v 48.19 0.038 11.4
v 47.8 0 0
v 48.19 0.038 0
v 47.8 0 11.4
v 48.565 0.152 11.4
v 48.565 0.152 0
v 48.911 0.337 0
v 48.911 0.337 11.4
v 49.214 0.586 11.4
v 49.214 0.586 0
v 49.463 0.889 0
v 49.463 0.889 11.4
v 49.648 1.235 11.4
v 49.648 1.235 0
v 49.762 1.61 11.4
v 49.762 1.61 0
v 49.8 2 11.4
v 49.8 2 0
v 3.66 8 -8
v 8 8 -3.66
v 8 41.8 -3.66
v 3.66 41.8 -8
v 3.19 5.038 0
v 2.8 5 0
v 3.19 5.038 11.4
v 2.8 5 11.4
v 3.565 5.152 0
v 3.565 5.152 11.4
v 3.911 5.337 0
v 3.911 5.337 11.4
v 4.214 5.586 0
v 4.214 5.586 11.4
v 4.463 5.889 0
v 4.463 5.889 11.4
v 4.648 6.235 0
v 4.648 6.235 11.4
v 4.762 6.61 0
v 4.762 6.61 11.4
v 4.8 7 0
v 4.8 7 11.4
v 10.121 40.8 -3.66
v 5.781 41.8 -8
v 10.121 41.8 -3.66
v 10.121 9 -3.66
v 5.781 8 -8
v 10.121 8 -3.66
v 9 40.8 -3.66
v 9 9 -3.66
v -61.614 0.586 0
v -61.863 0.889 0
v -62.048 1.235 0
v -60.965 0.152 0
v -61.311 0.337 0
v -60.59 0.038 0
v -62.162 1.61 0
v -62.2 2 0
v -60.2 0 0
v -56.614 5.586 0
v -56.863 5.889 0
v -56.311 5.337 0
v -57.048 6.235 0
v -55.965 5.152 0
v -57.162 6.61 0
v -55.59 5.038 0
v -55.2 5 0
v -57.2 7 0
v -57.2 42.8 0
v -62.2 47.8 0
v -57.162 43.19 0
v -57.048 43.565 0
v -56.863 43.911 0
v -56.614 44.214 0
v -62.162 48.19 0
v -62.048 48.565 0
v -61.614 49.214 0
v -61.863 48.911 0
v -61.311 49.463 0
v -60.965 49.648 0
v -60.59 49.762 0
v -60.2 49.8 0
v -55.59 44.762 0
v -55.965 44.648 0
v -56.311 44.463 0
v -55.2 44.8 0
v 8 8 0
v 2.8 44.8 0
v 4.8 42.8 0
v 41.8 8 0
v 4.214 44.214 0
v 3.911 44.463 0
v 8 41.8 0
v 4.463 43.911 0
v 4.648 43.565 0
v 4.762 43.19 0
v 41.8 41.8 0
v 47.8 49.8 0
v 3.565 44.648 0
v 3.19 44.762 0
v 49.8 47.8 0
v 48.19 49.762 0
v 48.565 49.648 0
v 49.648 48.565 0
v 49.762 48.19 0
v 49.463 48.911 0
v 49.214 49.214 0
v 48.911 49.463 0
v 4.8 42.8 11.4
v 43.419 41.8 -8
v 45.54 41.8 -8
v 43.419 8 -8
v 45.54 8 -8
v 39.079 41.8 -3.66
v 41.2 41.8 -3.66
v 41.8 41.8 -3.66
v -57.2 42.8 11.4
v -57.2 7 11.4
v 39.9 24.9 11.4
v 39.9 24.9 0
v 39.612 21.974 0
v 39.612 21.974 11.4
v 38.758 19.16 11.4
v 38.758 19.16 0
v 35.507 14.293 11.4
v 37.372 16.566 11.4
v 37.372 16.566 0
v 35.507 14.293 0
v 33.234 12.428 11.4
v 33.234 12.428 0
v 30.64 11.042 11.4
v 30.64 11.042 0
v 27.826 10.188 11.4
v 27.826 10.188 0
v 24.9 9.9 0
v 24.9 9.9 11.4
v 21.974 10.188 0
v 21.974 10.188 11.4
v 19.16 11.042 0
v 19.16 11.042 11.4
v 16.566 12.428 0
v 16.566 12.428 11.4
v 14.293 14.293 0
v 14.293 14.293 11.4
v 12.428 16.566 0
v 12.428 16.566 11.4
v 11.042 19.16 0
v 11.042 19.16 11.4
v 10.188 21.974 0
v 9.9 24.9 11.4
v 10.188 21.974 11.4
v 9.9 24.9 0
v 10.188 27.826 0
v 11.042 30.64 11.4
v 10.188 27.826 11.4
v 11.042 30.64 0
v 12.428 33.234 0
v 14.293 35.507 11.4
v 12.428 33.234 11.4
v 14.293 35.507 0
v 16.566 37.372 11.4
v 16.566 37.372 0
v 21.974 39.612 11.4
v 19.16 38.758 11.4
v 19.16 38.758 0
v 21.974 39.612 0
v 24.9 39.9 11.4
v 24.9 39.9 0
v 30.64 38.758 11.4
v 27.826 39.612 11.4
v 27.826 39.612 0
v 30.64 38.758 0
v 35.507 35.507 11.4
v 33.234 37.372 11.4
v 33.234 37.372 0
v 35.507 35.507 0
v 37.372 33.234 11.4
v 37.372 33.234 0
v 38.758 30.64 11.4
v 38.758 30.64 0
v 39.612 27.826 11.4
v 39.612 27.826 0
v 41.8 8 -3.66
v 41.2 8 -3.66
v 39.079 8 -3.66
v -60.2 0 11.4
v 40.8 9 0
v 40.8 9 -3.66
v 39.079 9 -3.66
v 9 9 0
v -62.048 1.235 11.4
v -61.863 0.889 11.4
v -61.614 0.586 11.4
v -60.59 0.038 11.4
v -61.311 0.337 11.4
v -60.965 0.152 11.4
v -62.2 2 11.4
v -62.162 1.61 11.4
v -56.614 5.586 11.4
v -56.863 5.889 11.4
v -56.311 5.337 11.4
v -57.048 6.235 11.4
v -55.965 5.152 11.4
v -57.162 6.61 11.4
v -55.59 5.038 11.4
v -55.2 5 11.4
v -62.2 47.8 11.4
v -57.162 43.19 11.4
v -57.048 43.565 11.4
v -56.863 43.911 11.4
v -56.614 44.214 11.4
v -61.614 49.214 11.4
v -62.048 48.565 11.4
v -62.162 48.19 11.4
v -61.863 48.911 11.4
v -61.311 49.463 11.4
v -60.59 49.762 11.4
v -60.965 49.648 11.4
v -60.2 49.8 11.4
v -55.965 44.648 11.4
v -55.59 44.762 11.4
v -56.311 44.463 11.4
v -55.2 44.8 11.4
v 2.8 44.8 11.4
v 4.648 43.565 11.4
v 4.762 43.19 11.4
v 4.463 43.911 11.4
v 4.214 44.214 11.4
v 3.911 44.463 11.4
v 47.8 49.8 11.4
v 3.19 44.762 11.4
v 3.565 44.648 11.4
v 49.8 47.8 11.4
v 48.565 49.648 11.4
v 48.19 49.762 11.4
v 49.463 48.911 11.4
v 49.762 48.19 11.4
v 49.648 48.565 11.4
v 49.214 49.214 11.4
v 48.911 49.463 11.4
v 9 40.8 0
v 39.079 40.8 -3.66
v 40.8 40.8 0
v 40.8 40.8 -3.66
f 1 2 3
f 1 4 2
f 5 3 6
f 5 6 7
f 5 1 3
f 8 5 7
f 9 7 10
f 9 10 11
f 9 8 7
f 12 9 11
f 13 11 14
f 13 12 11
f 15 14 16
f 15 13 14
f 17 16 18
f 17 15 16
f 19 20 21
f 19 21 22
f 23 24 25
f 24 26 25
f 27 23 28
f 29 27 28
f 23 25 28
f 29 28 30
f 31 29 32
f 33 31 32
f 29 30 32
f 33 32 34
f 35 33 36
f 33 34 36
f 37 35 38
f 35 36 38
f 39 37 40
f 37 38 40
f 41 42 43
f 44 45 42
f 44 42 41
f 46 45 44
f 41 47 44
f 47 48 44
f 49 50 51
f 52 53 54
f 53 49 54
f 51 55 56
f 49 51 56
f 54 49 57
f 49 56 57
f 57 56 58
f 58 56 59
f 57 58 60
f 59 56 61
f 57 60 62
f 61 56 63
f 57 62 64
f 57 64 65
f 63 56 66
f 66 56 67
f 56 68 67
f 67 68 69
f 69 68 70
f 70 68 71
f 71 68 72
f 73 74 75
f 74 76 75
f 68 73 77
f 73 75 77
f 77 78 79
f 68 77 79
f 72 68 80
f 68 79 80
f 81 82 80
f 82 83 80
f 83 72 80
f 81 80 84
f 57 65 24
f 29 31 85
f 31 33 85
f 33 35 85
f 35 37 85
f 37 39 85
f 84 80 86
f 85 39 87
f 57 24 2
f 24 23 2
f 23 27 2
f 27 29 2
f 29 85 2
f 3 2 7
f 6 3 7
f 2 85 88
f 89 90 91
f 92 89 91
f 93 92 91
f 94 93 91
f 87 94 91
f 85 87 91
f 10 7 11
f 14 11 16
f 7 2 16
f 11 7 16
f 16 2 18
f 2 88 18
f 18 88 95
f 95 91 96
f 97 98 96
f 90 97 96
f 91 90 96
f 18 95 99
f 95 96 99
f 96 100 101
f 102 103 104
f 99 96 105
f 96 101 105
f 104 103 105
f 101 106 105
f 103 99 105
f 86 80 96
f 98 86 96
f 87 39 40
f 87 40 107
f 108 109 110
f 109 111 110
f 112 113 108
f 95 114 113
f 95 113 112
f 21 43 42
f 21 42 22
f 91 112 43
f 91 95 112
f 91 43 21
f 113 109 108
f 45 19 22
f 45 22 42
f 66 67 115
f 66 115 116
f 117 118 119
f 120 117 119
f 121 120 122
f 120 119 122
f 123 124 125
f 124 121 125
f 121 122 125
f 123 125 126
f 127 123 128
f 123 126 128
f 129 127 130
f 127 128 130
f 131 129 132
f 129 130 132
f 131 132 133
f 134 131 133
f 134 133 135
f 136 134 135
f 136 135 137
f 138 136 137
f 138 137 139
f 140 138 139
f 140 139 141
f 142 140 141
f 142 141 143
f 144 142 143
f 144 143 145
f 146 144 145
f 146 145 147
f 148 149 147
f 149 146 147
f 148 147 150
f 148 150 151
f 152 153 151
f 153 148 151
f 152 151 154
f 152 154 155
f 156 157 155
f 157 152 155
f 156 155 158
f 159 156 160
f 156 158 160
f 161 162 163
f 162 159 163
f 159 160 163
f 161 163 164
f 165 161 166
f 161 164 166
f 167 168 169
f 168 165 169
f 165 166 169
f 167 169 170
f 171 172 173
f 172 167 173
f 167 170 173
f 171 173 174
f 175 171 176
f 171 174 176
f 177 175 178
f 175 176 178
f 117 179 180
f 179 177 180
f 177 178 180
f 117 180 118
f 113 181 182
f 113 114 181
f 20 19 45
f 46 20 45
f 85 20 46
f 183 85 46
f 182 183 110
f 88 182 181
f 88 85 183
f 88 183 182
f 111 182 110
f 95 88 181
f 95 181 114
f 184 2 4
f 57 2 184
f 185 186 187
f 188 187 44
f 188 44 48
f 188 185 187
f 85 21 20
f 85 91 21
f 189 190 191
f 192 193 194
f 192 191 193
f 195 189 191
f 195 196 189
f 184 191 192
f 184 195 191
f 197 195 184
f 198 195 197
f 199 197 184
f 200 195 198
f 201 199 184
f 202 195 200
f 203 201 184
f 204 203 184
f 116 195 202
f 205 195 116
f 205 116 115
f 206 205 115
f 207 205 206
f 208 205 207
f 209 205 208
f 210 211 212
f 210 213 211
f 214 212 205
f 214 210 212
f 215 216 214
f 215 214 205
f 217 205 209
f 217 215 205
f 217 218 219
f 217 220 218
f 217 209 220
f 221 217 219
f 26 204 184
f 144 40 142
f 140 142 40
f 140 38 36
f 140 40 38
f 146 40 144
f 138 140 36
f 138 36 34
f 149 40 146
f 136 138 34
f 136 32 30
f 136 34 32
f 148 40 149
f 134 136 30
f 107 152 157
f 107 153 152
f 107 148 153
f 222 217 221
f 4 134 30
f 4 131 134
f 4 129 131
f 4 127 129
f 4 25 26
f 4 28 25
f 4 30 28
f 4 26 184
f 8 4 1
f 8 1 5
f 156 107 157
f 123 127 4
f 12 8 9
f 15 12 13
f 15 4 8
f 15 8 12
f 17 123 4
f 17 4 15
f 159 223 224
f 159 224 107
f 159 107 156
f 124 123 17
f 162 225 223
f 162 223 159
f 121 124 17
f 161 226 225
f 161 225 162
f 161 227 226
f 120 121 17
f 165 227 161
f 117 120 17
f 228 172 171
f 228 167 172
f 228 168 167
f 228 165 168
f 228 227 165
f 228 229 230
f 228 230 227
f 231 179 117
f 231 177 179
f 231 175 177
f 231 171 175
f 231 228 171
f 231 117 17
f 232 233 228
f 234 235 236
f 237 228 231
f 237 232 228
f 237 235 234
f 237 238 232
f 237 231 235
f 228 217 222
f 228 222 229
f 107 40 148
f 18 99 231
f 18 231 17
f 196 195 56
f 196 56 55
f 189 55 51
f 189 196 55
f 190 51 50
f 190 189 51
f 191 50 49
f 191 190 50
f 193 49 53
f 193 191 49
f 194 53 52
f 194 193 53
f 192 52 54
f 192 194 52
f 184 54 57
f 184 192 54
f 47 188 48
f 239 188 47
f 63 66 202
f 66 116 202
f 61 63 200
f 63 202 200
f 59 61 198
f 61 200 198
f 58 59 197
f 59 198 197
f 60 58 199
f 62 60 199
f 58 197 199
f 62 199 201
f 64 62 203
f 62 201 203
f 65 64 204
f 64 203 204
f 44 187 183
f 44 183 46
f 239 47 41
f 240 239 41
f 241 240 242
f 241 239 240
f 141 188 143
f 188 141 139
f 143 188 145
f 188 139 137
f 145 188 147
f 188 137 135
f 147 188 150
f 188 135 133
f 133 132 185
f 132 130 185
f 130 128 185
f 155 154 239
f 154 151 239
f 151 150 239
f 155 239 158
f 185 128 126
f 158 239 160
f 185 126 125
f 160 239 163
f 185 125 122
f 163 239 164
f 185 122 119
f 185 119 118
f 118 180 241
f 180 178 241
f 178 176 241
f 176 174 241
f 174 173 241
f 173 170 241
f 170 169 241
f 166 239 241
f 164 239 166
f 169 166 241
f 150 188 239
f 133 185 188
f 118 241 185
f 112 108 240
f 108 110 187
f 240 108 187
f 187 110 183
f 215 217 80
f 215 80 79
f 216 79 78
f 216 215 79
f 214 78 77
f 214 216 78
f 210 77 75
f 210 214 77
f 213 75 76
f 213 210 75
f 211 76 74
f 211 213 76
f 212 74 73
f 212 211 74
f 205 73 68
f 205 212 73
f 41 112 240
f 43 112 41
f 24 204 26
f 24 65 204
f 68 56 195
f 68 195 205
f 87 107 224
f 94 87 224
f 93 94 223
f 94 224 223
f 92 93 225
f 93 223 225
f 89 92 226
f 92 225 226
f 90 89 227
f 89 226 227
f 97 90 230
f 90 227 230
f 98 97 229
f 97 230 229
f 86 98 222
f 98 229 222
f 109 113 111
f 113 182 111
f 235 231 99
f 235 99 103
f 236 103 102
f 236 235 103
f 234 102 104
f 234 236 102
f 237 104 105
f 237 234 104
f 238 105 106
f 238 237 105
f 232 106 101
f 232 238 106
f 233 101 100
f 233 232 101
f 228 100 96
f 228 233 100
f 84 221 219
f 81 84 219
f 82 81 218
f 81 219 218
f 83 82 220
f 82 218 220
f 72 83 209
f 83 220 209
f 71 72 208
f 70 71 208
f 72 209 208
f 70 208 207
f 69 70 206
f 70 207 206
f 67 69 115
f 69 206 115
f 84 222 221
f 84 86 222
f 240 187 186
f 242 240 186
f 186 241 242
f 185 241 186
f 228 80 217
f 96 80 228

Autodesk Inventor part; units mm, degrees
ref_plane "YZ Plane" through (0, 0, 0) normal (1, 0, 0) x (0, 1, 0)
ref_plane "XZ Plane" through (0, 0, 0) normal (0, 1, 0) x (-1, 0, 0)
ref_plane "XY Plane" through (0, 0, 0) normal (0, 0, 1) x (1, 0, 0)
sketch "Sketch1" plane through (0, 0, 0) normal (0, 0, 1) x (1, 0, 0)
  circle A0 centre (44.9, 4.9) radius 1.45 construction
  circle A1 centre (4.9, 4.9) radius 1.45 construction
  line L0 (2, 2) -> (2, 41.8) construction
  line L1 (47.8, 2) -> (2, 2) construction
  line L2 (47.8, 41.8) -> (47.8, 2) construction
  line L3 (41.8, 41.8) -> (47.8, 41.8) construction
  line L4 (41.8, 8) -> (41.8, 41.8) construction
  line L5 (8, 8) -> (41.8, 8) construction
  line L6 (8, 8) -> (8, 41.8) construction
  line L7 (2, 41.8) -> (8, 41.8) construction
  circle A2 centre (44.9, 44.9) radius 1.4 construction
  circle A3 centre (4.9, 44.9) radius 1.4 construction
  line L8 (2, 47.8) -> (47.8, 47.8) construction
  line L9 (2, 41.8) -> (2, 47.8) construction
  line L10 (47.8, 41.8) -> (2, 41.8) construction
  line L11 (47.8, 41.8) -> (47.8, 47.8) construction
  circle A4 centre (25.6838, 25.4066) radius 13.6 construction
  line L12 (44.1319, 49.8) -> (5.6681, 49.8) construction
  arc A5 (49.8, 47.8) -> (47.8, 49.8) centre (47.8, 47.8) ccw construction
  line L13 (49.8, 41.8) -> (49.8, 47.8) construction
  arc A6 (2, 49.8) -> (0, 47.8) centre (2, 47.8) ccw construction
  arc A7 (0, 2) -> (2, 0) centre (2, 2) ccw construction
  arc A8 (47.8, 0) -> (49.8, 2) centre (47.8, 2) ccw construction
  line L14 (49.8, 0) -> (-62.2, 0)
  line L15 (-62.2, 0) -> (-62.2, 49.8)
  line L16 (-62.2, 49.8) -> (49.8, 49.8)
  line L17 (49.8, 49.8) -> (49.8, 0)
  line L18 (8, 3.7577) -> (41.8, 3.7577) construction
  line L19 (41.8, 0) -> (41.8, 3.7577) construction
  line L20 (8, 0) -> (41.8, 0) construction
  line L21 (8, 0) -> (8, 3.7577) construction
  line L22 (46.1838, 8) -> (46.1838, 41.8) construction
  line L23 (49.8, 41.8) -> (46.1838, 41.8) construction
  line L24 (49.8, 8) -> (49.8, 41.8) construction
  line L25 (46.1838, 8) -> (49.8, 8) construction
  line L26 (3.6162, 41.8) -> (3.6162, 8) construction
  line L27 (0, 8) -> (3.6162, 8) construction
  line L28 (0, 8) -> (0, 41.8) construction
  line L29 (3.6162, 41.8) -> (0, 41.8) construction
  circle A9 centre (24.9, 24.9) radius 15
  arc A10 (42.3945, 24.4616) -> (22.4616, 42.2293) centre (24.9, 24.9) ccw construction
  arc A11 (22.5619, 16.1033) -> (42.3945, 24.4616) centre (29.0002, 28.5351) ccw construction
  line L30 (22.5619, 16.1033) -> (22.3031, 15.1374) construction
  arc A12 (22.3031, 15.1374) -> (41.5232, 19.4302) centre (29.3361, 28.8218) ccw construction
  arc A13 (15.3425, 10.2404) -> (41.5232, 19.4302) centre (24.9, 24.9) ccw construction
  arc A14 (18.2047, 31.6263) -> (15.3425, 10.2404) centre (25.6173, 19.7498) ccw construction
  line L31 (18.2047, 31.6263) -> (17.4976, 32.3335) construction
  arc A15 (17.4976, 32.3335) -> (11.1478, 14.0775) centre (25.6302, 19.2725) ccw construction
  arc A16 (16.2809, 40.1303) -> (11.1478, 14.0775) centre (24.9, 24.9) ccw construction
  arc A17 (34.0602, 27.4798) -> (16.2809, 40.1303) centre (20.0844, 26.6568) ccw construction
  line L32 (34.0602, 27.4798) -> (35.0261, 27.7386) construction
  arc A18 (35.0261, 27.7386) -> (22.4616, 42.2293) centre (19.6533, 27.1018) ccw construction
  line L33 (3.6577, 41.7) -> (8.1, 46.1423) construction
  line L34 (0, 41.7) -> (3.6577, 41.7) construction
  line L35 (0, 8.1) -> (0, 41.7) construction
  line L36 (3.6577, 8.1) -> (0, 8.1) construction
  line L37 (8.1, 3.6577) -> (3.6577, 8.1) construction
  line L38 (8.1, 0) -> (8.1, 3.6577) construction
  line L39 (41.7, 0) -> (8.1, 0) construction
  line L40 (41.7, 3.6577) -> (41.7, 0) construction
  line L41 (46.1423, 8.1) -> (41.7, 3.6577) construction
  line L42 (49.8, 8.1) -> (46.1423, 8.1) construction
  line L43 (49.8, 41.7) -> (49.8, 8.1) construction
  line L44 (46.1423, 41.7) -> (49.8, 41.7) construction
  line L45 (41.7, 46.1423) -> (46.1423, 41.7) construction
  line L46 (41.7, 49.8) -> (41.7, 46.1423) construction
  line L47 (8.1, 49.8) -> (41.7, 49.8) construction
  line L48 (8.1, 46.1423) -> (8.1, 49.8) construction
  circle A19 centre (24.9, 24.9) radius 16.9 construction
  point P0 (0, 0)
  dimension "d0" = 30
  dimension "d4" = 112
extrude "Extrusion1" add sketch "Sketch1" along normal blind 11.4
fillet "Fillet1" radius 2 4 edges at (49.8, 49.8, 5.7) (-62.2, 49.8, 5.7) (49.8, 0, 5.7) (-62.2, 0, 5.7)
sketch "Sketch2" plane through (0, 0, 0) normal (0, 0, -1) x (-1, 0, 0)
  line L0 (-41.8, 8) -> (-41.8, 41.8) construction
  line L1 (-8, 8) -> (-41.8, 8) construction
  line L2 (-8, 8) -> (-8, 41.8) construction
  line L3 (-47.8, 41.8) -> (-2, 41.8) construction
  circle A0 centre (-24.9, 24.9) radius 15 construction
  arc A1 (60.2, 0) -> (62.2, 2) centre (60.2, 2) ccw construction
  line L4 (62.2, 2) -> (62.2, 47.8) construction
  arc A2 (62.2, 47.8) -> (60.2, 49.8) centre (60.2, 47.8) ccw construction
  line L5 (60.2, 49.8) -> (-47.8, 49.8) construction
  arc A3 (-47.8, 49.8) -> (-49.8, 47.8) centre (-47.8, 47.8) ccw construction
  line L6 (-49.8, 47.8) -> (-49.8, 2) construction
  arc A4 (-49.8, 2) -> (-47.8, 0) centre (-47.8, 2) ccw construction
  line L7 (-47.8, 0) -> (60.2, 0) construction
  line L8 (-41.8, 41.8) -> (-8, 41.8)
  line L9 (-8, 41.8) -> (-8, 8)
  line L10 (-8, 8) -> (-41.8, 8)
  line L11 (-41.8, 8) -> (-41.8, 41.8)
  line L12 (-9, 40.8) -> (-40.8, 40.8)
  line L13 (-40.8, 40.8) -> (-40.8, 9)
  line L14 (-40.8, 9) -> (-9, 9)
  line L15 (-9, 9) -> (-9, 40.8)
  point P0 (0, 0)
  dimension "d6" = 0
  dimension "d7" = 0
  dimension "d8" = 0
  dimension "d9" = 0
  dimension "d10" = 1
extrude "Extrusion2" add sketch "Sketch2" along normal blind 3.66
sketch "Sketch3" plane through (8, 8, 0) normal (0, -1, 0) x (1, 0, 0)
  line L0 (0, 0) -> (33.8, 0) construction
  line L1 (0, 0) -> (0, -3.66) construction
  line L2 (33.8, -3.66) -> (0, -3.66) construction
  line L3 (33.8, 0) -> (33.8, -3.66) construction
  line L4 (33.5, -3.7577) -> (33.5, -8) construction
  line L5 (-0.3, -8) -> (33.5, -8) construction
  line L6 (-0.3, -3.7577) -> (-0.3, -8) construction
  line L7 (33.5, -3.7577) -> (-0.3, -3.7577) construction
  line L8 (33.5, 0) -> (33.5, -3.6162) construction
  line L9 (-0.3, -3.6162) -> (-0.3, 0) construction
  line L10 (33.8, 0) -> (33.8, -3.66) construction
  line L11 (33.8, 0) -> (33.8, -3.66) construction
  line L12 (33.5, -8) -> (33.5, -3.7577) construction
  line L13 (33.5, -3.7577) -> (-0.3, -3.7577) construction
  line L14 (-0.3, -3.7577) -> (-0.3, -8) construction
  line L15 (-0.3, -8) -> (-4.6838, -8) construction
  line L16 (-2.886, -6.2022) -> (-4.6838, -8) construction
  arc A0 (-2.886, -6.2022) -> (-2.0978, -5.414) centre (-3.4, -4.9) ccw construction
  line L17 (-0.3, -3.6162) -> (-2.0978, -5.414) construction
  line L18 (-0.3, -3.6162) -> (-0.3, 0) construction
  line L19 (-0.3, 0) -> (33.5, 0) construction
  line L20 (33.5, 0) -> (33.5, -3.6162) construction
  line L21 (35.2978, -5.414) -> (33.5, -3.6162) construction
  arc A1 (35.2978, -5.414) -> (36.086, -6.2022) centre (36.6, -4.9) ccw construction
  line L22 (37.8838, -8) -> (36.086, -6.2022) construction
  line L23 (37.8838, -8) -> (33.5, -8) construction
  line L24 (0, -3.66) -> (33.8, -3.66) projected
  line L25 (0, -3.66) -> (-4.34, -8)
  line L26 (-4.34, -8) -> (-2.2187, -8)
  line L27 (-2.2187, -8) -> (2.1213, -3.66)
  line L28 (16.6, -3.7577) -> (16.6, -8) construction
  line L29 (2.1213, -3.66) -> (0, -3.66)
  line L30 (1, -3.66) -> (32.8, -3.66) projected
  line L31 (33.5, -3.7577) -> (33.5, -8) construction
  line L32 (33.5, -3.7577) -> (33.5, -8) construction
  line L33 (33.5, -8) -> (37.8838, -8) construction
  line L34 (36.086, -6.2022) -> (37.8838, -8) construction
  arc A2 (35.2978, -5.414) -> (36.086, -6.2022) centre (36.6, -4.9) ccw construction
  line L35 (33.5, -3.6162) -> (35.2978, -5.414) construction
  line L36 (33.2, -3.66) -> (37.54, -8)
  line L37 (37.54, -8) -> (35.4187, -8)
  line L38 (35.4187, -8) -> (31.0787, -3.66)
  line L39 (31.0787, -3.66) -> (33.2, -3.66)
  point P0 (-8, 0)
  point P1 (32.2, -3.66)
  dimension "d13" = 1.5
extrude "Extrusion3" add sketch "Sketch3" against normal up to surface (33.8 mm away)
sketch "Sketch4" plane through (0, 0, 0) normal (0, 0, -1) x (-1, 0, 0)
  arc A0 (60.2, 0) -> (62.2, 2) centre (60.2, 2) ccw construction
  line L0 (62.2, 2) -> (62.2, 47.8) construction
  arc A1 (62.2, 47.8) -> (60.2, 49.8) centre (60.2, 47.8) ccw construction
  line L1 (60.2, 49.8) -> (-47.8, 49.8) construction
  arc A2 (-47.8, 49.8) -> (-49.8, 47.8) centre (-47.8, 47.8) ccw construction
  line L2 (-49.8, 47.8) -> (-49.8, 2) construction
  arc A3 (-49.8, 2) -> (-47.8, 0) centre (-47.8, 2) ccw construction
  line L3 (-47.8, 0) -> (60.2, 0) construction
  line L4 (-8, 41.8) -> (-8, 8) construction
  line L5 (-8, 8) -> (-41.8, 8) construction
  line L6 (-41.8, 8) -> (-41.8, 41.8) construction
  line L7 (-41.8, 41.8) -> (-8, 41.8) construction
  line L8 (-4.8, 44.8) -> (57.2, 44.8)
  line L9 (57.2, 44.8) -> (57.2, 5)
  line L10 (57.2, 5) -> (-4.8, 5)
  line L11 (-4.8, 5) -> (-4.8, 44.8)
  point P0 (0, 0)
  dimension "d16" = 45
  dimension "d17" = 5
  dimension "d18" = 5
  dimension "d19" = 5
extrude "Extrusion4" cut sketch "Sketch4" against normal through all
fillet "Fillet2" radius 2 4 edges at (4.8, 5, 5.7) (-57.2, 5, 5.7) (-57.2, 44.8, 5.7) (4.8, 44.8, 5.7)
equation "\"d18\" = d17"
equation "\"d19\" = d17"
properties part number "30_Smartphone_Holder_v3"
